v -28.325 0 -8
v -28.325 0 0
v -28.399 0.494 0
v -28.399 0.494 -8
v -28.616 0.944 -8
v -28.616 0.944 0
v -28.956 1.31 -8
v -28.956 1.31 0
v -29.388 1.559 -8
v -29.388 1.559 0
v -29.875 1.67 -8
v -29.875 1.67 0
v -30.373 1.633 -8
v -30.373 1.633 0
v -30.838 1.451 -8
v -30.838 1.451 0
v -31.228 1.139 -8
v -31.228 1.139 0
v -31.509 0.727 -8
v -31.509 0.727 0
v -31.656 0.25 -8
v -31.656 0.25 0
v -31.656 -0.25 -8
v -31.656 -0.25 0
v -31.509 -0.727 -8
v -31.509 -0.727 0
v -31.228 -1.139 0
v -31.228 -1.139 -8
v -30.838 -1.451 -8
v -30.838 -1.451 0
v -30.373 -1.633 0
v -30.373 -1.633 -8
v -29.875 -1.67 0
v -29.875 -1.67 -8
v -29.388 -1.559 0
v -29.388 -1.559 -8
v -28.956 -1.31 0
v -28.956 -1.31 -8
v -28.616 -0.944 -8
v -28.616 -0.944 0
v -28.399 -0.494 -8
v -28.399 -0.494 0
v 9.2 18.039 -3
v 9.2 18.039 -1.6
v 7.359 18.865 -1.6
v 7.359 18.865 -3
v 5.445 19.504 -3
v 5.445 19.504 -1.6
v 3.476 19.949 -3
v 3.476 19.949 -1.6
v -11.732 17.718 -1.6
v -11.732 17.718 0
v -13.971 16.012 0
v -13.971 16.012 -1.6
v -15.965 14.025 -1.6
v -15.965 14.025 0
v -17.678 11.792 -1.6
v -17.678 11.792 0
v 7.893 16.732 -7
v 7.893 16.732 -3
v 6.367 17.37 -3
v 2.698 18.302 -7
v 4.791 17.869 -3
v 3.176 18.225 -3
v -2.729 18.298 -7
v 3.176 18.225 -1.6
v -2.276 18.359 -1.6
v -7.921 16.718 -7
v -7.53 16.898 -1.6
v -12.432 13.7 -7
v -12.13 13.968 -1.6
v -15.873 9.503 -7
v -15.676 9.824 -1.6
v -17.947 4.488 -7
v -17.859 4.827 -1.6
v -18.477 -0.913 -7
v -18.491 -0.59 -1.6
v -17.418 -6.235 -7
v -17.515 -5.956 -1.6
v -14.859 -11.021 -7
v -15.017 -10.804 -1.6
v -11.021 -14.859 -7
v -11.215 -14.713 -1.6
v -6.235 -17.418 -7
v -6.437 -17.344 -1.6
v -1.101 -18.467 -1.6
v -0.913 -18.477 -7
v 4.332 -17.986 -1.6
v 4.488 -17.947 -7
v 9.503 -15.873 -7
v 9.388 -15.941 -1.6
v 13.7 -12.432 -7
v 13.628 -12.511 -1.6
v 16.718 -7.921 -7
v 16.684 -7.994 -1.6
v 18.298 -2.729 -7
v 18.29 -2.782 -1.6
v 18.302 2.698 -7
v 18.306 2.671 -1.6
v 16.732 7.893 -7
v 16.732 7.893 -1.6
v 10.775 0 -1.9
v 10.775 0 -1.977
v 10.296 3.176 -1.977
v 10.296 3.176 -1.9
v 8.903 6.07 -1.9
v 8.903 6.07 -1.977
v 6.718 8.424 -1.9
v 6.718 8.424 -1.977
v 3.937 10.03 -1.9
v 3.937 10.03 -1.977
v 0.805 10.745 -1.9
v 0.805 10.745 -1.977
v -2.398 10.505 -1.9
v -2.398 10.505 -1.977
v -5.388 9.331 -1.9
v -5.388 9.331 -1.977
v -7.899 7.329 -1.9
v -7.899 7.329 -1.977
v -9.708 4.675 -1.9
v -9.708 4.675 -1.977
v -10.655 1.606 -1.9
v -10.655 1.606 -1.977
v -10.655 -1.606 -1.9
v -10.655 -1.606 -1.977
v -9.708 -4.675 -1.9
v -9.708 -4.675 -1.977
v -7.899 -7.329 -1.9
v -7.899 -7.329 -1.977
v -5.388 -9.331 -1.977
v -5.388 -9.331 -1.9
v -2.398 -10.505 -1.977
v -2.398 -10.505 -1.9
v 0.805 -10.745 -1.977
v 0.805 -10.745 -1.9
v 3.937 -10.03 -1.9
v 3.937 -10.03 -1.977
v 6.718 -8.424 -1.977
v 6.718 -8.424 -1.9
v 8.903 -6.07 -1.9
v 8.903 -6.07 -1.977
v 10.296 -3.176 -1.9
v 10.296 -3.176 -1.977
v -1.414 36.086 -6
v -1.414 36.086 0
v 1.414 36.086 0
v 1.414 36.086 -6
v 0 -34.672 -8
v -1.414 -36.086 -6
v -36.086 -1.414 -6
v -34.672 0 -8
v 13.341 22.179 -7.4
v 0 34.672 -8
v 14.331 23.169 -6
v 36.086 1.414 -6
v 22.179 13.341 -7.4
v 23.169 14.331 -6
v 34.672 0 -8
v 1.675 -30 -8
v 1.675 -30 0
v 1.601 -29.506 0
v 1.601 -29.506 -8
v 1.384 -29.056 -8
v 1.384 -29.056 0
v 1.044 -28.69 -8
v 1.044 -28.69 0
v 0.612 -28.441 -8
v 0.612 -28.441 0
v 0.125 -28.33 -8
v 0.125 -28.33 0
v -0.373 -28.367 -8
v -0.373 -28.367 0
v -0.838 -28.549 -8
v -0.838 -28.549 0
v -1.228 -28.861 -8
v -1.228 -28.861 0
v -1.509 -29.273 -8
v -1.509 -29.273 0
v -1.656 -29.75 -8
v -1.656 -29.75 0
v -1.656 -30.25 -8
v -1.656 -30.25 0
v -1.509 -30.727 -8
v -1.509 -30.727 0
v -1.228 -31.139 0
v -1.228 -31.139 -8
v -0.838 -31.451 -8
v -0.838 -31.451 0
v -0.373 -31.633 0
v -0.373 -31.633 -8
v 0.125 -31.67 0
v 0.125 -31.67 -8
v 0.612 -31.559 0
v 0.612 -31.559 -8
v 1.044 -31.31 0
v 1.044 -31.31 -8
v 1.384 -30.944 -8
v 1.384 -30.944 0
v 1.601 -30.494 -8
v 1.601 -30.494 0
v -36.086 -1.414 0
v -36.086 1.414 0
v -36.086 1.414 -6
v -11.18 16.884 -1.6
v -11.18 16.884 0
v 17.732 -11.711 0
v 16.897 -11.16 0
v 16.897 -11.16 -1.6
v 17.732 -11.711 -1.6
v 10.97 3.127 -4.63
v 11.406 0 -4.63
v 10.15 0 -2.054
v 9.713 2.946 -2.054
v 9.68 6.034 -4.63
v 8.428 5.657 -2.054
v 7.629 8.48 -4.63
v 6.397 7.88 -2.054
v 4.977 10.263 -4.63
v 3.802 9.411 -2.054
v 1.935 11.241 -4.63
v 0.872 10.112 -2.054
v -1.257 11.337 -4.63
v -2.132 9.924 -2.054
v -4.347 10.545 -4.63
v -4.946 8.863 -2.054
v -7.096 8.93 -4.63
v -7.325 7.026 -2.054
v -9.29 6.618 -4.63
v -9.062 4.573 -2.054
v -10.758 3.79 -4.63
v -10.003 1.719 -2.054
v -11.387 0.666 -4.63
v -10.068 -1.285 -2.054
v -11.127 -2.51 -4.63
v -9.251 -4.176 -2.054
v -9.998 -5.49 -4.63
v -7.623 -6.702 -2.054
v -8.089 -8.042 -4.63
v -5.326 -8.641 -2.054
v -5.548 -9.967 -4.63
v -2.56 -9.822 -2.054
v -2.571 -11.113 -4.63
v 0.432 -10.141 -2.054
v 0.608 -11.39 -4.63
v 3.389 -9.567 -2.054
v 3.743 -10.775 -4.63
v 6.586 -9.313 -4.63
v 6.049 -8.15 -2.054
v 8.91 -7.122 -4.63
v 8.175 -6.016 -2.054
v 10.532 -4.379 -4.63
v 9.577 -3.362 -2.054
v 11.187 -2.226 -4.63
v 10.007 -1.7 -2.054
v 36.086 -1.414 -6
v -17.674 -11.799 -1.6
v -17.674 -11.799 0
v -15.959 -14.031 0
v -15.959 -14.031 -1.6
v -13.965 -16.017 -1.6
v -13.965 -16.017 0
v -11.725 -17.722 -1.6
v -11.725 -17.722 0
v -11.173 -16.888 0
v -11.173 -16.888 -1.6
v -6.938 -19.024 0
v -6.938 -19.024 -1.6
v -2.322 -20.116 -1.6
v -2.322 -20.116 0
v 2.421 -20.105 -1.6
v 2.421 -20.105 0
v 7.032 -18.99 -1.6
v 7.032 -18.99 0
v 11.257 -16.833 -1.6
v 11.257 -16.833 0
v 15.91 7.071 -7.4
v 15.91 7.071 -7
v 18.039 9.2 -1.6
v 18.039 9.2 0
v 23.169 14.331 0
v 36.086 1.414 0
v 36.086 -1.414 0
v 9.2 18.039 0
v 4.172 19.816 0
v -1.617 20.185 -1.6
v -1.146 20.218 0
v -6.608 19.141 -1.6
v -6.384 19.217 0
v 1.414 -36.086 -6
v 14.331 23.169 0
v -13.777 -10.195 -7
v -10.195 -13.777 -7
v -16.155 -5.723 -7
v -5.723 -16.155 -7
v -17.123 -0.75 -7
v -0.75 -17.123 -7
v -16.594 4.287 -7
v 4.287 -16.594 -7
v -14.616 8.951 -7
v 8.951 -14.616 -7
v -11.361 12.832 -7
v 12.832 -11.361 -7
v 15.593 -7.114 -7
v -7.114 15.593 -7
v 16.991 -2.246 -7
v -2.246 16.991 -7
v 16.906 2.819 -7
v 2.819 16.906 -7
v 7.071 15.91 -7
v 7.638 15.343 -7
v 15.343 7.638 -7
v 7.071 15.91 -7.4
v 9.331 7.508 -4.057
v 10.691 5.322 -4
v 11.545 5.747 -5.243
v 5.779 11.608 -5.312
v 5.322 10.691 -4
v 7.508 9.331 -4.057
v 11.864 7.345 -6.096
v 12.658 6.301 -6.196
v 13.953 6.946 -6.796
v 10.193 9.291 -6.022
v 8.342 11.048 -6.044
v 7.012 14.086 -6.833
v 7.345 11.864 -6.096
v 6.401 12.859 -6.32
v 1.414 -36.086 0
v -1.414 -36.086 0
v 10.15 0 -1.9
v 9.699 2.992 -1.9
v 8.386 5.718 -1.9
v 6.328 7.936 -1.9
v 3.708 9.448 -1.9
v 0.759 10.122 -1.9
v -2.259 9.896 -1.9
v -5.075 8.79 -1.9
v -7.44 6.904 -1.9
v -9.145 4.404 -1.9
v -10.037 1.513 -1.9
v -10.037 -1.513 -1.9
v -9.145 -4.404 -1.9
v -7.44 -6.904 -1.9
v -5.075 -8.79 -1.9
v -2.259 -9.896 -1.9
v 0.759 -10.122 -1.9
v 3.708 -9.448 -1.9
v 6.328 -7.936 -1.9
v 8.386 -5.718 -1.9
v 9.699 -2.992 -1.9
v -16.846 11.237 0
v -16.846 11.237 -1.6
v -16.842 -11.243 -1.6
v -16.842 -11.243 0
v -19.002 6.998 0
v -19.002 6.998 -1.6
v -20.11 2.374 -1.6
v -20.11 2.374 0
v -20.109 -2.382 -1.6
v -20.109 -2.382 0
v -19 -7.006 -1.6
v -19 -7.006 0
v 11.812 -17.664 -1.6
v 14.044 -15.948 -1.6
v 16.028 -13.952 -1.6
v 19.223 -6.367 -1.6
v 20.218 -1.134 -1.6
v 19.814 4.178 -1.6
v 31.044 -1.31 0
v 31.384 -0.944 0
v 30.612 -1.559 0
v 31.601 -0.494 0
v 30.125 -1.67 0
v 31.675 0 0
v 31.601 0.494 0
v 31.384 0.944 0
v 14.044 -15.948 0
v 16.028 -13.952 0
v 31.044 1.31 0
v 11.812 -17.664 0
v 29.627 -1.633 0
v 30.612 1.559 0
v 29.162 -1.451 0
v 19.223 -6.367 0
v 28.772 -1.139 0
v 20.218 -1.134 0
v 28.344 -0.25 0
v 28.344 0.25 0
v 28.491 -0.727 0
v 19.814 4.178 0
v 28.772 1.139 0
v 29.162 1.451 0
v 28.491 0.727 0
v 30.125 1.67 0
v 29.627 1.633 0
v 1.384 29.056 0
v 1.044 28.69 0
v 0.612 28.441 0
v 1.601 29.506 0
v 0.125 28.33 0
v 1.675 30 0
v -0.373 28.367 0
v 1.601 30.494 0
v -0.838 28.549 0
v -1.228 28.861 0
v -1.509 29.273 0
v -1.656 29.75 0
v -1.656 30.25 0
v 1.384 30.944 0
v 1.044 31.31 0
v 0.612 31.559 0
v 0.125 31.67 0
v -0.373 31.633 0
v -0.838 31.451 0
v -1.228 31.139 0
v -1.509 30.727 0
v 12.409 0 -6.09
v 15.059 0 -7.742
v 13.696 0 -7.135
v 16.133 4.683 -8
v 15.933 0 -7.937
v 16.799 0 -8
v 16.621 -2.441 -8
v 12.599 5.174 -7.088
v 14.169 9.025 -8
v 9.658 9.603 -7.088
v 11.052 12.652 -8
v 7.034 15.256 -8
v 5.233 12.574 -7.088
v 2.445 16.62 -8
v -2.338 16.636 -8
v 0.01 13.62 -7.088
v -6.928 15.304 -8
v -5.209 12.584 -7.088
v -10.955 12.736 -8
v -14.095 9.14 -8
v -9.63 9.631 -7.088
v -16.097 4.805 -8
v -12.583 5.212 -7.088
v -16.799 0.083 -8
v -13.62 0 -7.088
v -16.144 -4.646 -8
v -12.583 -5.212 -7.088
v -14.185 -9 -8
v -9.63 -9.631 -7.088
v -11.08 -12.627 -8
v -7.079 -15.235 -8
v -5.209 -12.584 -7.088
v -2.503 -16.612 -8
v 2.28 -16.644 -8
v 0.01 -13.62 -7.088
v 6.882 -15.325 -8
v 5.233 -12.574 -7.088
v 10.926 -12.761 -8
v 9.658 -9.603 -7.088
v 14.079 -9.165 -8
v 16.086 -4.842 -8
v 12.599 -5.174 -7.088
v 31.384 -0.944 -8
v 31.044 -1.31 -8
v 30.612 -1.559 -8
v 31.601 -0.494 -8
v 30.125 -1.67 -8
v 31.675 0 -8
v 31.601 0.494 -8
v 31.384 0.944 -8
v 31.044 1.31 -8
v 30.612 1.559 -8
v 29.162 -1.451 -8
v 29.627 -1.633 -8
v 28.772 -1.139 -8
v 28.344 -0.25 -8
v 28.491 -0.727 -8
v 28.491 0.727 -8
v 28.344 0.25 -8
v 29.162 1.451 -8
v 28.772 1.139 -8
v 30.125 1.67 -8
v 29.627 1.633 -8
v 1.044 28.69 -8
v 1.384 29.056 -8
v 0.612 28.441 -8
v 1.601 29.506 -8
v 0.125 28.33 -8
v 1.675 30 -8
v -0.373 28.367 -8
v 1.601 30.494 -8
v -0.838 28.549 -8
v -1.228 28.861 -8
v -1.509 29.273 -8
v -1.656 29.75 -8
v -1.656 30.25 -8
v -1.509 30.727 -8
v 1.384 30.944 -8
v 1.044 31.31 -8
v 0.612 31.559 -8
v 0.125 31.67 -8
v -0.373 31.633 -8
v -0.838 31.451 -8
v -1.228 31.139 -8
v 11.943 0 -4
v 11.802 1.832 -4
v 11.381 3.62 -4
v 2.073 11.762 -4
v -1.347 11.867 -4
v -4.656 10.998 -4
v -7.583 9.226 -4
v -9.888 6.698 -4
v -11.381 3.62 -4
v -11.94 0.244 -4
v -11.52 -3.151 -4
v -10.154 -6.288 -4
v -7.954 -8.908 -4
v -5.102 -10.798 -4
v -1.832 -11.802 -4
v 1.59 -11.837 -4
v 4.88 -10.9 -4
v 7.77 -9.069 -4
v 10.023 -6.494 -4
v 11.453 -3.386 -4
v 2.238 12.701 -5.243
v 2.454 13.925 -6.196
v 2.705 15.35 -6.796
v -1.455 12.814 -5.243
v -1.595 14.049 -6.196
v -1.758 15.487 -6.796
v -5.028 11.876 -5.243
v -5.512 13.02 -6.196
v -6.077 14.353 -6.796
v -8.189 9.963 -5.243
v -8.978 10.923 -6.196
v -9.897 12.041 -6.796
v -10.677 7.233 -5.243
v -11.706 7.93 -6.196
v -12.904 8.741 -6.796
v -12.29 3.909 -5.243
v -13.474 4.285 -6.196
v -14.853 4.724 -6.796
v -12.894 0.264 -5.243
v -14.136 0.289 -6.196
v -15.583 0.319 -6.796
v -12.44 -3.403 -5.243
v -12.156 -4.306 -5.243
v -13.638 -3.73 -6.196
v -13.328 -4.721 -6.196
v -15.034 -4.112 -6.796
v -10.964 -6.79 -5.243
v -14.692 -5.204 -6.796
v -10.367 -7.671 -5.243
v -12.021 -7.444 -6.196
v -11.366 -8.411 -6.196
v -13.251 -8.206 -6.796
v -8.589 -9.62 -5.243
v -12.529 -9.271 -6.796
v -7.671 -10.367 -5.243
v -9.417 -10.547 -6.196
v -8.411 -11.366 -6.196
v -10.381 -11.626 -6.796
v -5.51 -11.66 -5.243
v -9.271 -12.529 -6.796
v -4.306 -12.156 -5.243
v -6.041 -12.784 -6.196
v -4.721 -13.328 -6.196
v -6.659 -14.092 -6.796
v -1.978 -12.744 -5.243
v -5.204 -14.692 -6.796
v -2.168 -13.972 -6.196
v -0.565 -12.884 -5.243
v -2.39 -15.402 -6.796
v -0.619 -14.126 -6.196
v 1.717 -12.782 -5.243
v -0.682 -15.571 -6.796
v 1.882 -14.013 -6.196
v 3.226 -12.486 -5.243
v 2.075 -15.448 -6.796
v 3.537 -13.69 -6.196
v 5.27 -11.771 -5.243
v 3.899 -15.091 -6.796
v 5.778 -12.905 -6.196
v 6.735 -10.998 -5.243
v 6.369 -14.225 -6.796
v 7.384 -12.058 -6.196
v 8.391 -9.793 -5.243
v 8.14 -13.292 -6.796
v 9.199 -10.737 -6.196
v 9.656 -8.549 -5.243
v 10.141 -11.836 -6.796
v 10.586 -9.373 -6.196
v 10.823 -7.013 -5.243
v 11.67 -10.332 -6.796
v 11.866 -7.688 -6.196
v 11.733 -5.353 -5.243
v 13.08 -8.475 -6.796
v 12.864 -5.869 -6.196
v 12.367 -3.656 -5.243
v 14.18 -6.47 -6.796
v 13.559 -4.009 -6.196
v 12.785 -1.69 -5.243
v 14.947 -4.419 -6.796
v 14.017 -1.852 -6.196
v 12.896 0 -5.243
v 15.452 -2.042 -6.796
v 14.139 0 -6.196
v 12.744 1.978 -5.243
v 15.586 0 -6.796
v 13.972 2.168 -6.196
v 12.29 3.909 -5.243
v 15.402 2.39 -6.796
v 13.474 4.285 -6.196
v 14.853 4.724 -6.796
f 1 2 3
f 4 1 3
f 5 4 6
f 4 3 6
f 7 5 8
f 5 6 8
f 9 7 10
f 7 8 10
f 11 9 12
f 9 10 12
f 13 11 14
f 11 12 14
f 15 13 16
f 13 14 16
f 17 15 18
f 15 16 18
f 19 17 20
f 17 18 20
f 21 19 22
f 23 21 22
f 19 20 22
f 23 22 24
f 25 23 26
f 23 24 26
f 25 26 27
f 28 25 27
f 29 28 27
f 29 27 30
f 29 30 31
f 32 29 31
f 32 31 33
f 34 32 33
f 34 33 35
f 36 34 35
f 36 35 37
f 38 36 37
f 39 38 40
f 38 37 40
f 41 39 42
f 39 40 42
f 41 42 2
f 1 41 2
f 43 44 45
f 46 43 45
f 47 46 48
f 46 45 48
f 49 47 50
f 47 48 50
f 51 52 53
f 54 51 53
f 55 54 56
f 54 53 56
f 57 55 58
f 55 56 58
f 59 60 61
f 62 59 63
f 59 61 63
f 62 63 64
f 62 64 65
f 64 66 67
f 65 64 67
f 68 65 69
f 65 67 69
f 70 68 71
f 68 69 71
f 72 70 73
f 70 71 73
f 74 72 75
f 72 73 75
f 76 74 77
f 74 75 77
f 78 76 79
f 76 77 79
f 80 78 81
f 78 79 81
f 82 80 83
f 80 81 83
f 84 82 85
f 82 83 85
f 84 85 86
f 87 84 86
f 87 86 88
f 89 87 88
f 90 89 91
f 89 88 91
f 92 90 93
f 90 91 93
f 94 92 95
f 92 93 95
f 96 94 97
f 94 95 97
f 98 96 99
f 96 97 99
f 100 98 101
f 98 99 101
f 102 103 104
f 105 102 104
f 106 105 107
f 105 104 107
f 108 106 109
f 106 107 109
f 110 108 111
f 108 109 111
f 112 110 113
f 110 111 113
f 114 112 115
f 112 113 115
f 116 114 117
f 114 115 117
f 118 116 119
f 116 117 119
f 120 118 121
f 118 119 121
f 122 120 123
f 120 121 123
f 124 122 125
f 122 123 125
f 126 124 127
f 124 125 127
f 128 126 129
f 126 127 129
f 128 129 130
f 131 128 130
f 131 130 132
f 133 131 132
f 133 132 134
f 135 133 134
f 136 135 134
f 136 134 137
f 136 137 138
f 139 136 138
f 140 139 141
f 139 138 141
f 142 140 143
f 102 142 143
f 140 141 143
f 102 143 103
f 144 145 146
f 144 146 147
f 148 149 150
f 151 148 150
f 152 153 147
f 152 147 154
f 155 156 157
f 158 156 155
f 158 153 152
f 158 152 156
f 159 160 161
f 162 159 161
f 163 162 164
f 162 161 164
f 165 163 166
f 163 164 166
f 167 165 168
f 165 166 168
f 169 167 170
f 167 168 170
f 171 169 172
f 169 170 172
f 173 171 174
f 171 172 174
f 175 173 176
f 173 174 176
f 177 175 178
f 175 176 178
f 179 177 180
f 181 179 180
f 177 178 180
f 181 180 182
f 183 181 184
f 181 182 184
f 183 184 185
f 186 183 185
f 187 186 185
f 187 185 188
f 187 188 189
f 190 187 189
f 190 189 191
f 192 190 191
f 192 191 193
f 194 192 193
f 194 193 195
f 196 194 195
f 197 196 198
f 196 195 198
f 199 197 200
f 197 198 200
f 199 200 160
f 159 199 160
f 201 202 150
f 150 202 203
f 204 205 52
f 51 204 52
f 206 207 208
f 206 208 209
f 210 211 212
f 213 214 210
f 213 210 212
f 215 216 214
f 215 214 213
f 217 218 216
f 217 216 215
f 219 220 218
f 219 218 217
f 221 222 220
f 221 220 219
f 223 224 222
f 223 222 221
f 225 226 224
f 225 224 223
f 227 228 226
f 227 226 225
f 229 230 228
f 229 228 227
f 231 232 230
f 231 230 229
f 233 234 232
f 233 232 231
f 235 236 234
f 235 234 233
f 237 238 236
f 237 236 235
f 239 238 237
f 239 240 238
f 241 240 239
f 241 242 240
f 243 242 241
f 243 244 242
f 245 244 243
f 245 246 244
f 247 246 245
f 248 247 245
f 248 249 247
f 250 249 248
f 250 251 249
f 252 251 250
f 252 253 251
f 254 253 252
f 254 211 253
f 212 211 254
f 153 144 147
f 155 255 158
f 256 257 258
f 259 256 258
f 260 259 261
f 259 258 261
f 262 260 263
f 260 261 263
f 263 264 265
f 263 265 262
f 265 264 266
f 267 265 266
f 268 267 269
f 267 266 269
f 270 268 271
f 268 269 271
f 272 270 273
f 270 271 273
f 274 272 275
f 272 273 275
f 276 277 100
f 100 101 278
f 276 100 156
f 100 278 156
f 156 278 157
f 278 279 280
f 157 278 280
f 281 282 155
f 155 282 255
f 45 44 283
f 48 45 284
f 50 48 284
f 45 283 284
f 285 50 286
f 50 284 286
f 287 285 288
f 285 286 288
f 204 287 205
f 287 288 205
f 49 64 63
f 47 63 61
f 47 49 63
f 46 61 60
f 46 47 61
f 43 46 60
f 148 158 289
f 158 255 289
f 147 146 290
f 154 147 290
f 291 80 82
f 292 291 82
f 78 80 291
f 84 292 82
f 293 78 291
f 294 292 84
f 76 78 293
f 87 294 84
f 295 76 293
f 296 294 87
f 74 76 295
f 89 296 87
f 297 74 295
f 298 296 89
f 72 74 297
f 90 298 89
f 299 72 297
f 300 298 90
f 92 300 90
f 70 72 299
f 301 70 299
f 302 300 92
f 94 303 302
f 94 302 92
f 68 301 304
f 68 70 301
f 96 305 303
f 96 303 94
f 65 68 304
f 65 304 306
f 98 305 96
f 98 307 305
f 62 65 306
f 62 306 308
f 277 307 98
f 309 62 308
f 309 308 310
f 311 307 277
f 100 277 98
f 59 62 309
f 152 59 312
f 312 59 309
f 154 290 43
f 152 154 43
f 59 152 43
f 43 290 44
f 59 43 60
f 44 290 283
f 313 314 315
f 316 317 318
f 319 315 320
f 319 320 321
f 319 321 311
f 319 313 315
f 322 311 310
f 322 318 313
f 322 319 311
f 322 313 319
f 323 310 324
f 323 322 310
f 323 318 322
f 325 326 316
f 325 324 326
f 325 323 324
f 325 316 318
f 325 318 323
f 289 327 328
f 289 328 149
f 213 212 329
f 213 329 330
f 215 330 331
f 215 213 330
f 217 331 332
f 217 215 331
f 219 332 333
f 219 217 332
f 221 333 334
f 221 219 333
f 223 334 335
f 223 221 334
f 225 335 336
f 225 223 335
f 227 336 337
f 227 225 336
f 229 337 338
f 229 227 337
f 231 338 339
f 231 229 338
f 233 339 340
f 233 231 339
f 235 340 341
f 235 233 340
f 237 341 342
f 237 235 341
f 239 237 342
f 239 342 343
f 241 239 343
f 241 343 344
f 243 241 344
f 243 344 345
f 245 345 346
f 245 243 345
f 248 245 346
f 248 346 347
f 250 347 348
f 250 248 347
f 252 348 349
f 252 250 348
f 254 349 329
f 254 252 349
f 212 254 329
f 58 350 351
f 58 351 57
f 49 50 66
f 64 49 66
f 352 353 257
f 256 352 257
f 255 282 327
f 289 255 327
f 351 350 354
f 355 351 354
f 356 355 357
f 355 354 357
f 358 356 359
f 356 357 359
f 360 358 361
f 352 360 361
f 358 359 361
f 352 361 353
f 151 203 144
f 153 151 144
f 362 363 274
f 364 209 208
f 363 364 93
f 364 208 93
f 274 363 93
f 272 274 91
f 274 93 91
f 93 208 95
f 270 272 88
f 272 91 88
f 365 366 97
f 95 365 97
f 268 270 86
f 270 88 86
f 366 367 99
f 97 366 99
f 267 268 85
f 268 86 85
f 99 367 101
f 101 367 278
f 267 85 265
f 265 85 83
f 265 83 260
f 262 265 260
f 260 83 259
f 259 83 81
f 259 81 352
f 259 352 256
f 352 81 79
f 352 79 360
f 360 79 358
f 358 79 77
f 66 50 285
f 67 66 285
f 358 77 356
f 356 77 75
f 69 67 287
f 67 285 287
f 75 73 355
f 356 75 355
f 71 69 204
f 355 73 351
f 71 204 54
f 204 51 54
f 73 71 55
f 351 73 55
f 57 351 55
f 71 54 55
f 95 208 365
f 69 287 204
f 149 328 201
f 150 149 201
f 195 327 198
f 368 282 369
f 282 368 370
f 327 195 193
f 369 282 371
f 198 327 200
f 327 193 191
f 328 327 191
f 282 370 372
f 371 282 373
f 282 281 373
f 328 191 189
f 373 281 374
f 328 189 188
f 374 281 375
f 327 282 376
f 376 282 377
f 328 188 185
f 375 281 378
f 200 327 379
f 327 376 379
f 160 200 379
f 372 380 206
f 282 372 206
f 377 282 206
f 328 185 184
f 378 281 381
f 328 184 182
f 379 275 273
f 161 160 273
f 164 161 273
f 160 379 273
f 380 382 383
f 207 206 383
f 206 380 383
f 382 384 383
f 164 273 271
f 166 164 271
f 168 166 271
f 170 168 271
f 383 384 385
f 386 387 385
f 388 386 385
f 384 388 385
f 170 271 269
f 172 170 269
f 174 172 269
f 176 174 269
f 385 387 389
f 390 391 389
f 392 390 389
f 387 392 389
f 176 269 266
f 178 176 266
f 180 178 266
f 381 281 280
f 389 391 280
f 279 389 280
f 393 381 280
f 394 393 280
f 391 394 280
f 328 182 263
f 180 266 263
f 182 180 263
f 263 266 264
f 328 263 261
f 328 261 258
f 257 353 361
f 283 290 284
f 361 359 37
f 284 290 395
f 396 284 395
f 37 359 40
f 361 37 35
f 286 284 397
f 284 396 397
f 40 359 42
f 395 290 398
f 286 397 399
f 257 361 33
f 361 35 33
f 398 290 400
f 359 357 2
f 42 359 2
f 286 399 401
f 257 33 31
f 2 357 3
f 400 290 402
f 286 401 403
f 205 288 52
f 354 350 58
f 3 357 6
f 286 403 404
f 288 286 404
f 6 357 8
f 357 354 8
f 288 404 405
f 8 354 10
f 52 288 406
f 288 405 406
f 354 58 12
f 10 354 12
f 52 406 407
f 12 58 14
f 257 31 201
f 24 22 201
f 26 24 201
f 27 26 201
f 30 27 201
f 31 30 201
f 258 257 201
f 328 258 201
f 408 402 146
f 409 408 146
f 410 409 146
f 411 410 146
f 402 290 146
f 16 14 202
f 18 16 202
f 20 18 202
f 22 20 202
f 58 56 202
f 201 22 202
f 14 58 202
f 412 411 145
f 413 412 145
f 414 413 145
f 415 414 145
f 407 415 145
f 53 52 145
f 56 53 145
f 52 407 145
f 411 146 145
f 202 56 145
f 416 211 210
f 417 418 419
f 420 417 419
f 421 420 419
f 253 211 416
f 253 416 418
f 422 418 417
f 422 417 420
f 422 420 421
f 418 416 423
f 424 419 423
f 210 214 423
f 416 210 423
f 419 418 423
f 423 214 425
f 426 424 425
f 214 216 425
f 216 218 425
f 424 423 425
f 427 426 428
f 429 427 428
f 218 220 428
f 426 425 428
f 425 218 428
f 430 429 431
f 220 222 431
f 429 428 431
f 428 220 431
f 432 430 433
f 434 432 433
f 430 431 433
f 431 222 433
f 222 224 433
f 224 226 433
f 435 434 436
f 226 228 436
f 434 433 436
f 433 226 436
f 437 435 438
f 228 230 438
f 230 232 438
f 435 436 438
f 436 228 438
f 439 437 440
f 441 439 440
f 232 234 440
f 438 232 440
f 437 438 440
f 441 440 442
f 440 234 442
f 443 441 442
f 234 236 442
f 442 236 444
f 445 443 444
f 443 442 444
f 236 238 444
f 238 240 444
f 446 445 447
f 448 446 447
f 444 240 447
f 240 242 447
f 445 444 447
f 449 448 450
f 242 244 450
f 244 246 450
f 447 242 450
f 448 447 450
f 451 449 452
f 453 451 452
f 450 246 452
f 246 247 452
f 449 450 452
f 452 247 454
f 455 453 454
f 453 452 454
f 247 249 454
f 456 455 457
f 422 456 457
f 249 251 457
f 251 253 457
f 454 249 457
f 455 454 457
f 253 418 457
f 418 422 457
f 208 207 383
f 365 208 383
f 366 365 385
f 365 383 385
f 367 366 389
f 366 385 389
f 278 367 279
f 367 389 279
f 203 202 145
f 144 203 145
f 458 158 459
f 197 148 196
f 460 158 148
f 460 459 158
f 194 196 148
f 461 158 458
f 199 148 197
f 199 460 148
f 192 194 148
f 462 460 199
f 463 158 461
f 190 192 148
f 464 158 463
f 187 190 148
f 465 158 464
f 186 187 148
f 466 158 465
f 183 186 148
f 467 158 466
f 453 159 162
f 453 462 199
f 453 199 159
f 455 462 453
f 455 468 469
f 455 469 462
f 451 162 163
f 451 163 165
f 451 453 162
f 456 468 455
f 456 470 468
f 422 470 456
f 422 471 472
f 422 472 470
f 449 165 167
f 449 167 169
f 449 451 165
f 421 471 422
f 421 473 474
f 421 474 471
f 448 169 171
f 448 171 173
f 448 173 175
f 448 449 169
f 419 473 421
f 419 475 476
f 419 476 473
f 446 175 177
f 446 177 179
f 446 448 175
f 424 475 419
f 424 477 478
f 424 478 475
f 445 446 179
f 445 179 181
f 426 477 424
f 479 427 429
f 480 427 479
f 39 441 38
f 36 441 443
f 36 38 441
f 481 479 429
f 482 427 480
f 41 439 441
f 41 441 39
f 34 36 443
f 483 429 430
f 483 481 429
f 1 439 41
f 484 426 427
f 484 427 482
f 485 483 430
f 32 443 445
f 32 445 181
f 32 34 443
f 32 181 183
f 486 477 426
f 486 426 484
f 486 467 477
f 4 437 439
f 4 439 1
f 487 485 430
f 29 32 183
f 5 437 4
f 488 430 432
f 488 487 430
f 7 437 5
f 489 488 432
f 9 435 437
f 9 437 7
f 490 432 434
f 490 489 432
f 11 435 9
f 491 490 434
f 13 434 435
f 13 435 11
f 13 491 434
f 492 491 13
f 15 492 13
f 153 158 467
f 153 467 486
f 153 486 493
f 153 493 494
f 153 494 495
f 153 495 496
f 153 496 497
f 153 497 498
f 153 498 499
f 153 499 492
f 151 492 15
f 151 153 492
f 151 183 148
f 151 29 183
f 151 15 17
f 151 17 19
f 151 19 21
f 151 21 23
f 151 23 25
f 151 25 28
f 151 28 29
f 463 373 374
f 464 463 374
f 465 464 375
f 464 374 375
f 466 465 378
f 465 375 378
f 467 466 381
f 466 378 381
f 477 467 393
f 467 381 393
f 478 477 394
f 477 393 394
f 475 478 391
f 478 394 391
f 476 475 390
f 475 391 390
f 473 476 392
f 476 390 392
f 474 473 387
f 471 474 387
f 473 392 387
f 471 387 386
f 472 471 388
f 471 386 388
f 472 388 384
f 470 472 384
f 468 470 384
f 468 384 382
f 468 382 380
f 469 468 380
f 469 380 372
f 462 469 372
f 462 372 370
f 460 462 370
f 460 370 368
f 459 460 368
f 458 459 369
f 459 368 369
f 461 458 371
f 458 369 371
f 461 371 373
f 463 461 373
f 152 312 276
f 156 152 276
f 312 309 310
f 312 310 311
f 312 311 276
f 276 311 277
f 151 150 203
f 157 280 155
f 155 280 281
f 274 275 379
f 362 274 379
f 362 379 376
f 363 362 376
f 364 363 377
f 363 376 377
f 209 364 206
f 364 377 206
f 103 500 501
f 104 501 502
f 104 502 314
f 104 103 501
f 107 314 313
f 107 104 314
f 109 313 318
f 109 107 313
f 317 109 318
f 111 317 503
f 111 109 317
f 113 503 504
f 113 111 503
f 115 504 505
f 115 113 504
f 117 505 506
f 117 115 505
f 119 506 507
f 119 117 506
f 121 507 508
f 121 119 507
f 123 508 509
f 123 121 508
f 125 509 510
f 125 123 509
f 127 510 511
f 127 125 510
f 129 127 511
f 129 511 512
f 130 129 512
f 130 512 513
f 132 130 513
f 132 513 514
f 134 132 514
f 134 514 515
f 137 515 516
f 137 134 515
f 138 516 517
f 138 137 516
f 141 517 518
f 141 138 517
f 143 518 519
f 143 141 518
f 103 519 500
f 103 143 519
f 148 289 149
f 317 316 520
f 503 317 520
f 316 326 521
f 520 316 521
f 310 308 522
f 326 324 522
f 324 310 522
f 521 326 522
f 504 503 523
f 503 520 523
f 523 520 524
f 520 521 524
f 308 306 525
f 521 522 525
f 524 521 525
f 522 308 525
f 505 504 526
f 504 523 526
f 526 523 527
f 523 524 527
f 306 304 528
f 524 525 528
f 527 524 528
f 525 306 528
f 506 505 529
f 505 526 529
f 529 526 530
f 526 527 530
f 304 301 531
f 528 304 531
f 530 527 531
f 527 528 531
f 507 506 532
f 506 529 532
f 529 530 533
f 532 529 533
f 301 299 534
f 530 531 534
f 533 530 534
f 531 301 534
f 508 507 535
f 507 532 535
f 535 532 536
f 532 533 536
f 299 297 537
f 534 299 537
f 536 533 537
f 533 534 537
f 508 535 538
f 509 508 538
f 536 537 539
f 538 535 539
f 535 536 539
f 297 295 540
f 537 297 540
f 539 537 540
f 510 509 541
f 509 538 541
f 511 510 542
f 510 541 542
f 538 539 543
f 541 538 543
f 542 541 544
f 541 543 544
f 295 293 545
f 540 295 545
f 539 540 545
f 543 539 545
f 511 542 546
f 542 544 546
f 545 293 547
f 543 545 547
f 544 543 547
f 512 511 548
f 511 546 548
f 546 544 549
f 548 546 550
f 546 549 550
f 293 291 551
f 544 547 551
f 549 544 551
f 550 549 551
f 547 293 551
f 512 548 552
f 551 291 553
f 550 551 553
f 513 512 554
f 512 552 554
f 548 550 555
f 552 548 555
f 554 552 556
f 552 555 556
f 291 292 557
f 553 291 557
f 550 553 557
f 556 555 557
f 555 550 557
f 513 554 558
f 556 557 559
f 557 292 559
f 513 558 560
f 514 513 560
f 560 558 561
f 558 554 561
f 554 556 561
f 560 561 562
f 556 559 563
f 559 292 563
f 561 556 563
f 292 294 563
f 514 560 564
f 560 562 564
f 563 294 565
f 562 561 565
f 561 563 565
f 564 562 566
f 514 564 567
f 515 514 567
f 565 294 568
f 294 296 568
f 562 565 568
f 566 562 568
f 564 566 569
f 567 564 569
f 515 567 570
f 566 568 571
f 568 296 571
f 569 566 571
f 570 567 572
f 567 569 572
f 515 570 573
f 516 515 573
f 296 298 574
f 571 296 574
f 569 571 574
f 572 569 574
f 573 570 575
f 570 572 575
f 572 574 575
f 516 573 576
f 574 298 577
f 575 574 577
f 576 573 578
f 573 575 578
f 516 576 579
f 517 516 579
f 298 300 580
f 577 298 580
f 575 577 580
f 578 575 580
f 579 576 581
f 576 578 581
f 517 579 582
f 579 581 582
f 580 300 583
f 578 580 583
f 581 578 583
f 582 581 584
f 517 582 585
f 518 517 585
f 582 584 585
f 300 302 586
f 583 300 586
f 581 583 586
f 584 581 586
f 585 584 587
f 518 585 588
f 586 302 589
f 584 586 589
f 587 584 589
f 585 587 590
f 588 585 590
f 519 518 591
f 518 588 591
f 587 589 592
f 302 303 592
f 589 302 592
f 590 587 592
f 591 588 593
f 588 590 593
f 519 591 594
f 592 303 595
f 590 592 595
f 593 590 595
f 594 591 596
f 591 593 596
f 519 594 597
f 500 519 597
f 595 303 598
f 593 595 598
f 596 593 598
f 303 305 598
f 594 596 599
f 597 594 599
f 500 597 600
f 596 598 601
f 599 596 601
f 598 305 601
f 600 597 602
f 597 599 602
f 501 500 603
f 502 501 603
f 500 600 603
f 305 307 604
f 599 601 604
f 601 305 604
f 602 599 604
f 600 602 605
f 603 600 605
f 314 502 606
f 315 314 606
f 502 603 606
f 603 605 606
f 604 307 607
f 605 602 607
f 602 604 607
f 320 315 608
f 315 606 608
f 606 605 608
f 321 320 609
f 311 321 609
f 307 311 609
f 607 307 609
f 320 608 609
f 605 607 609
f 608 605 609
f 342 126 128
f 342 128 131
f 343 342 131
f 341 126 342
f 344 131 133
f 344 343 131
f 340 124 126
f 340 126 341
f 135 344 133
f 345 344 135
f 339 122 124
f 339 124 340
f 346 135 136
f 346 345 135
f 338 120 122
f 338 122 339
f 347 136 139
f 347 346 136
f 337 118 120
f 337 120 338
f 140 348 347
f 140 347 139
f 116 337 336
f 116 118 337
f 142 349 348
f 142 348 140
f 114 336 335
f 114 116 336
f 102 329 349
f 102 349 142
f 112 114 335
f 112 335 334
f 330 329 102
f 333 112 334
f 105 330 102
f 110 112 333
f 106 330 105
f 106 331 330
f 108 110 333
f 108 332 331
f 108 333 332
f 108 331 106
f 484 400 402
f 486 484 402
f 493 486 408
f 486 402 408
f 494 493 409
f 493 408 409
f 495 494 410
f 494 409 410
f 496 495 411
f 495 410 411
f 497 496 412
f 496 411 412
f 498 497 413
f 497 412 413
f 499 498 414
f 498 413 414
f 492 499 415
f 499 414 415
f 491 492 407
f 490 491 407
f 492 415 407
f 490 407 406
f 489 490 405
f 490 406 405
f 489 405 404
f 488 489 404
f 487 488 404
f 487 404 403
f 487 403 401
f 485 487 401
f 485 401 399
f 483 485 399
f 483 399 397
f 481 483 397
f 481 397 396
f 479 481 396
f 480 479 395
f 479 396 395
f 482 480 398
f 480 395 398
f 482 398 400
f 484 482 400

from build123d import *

# Parameters (mm, degrees)
SKETCH_R         = 10.15
SKETCH_R_2       = 1.675
PAD_DEPTH        = 8
SKETCH001_R      = 18.5
POCKET_DEPTH     = 7
POCKET001_DEPTH  = 1.6
POCKET004_DEPTH  = 3
CHAMFER_SIZE     = 2
POCKET002_DEPTH  = 7.4
SKETCH005_R      = 10.775
SKETCH005_R_2    = 10.15
PAD001_DEPTH     = 5.1
CHAMFER001_ANGLE = 64
CHAMFER001_SIZE  = 2.9
CHAMFER002_ANGLE = 60
CHAMFER002_SIZE  = 2.9
FILLET_R         = 6


with BuildPart() as part:
    # Sketch → Pad (new body)
    with BuildSketch(Plane.XY):
        Polygon((0, 37.5), (37.5, 0), (0, -37.5), (-37.5, 0), align=None)
        Circle(SKETCH_R, mode=Mode.SUBTRACT)
        with Locations((0, 30)):
            Circle(SKETCH_R_2, mode=Mode.SUBTRACT)
        with Locations((30, 0)):
            Circle(SKETCH_R_2, mode=Mode.SUBTRACT)
        with Locations((0, -30)):
            Circle(SKETCH_R_2, mode=Mode.SUBTRACT)
        with Locations((-30, 0)):
            Circle(SKETCH_R_2, mode=Mode.SUBTRACT)
    extrude(amount=-PAD_DEPTH)

    # Sketch001 → Pocket (cut)
    with BuildSketch(Plane.XY):
        Circle(SKETCH001_R)
    extrude(amount=-POCKET_DEPTH, mode=Mode.SUBTRACT)

    # Sketch002 → Pocket001 (cut)
    with BuildSketch(Plane.XY):
        with BuildLine():
            Line((-16.846352, 11.236678), (-17.67827, 11.791576))
            ThreePointArc((-11.732099, 17.717798), (-15.000749, 15.051247), (-17.67827, 11.791576))
            Line((-11.18, 16.884019), (-11.732099, 17.717798))
            ThreePointArc((16.897228, -11.160027), (14.310444, 14.327376), (-11.18, 16.884019))
            Line((16.897228, -11.160027), (17.731659, -11.711139))
            ThreePointArc((11.812473, -17.664314), (15.068975, -14.98294), (17.731659, -11.711139))
            Line((11.256591, -16.833052), (11.812473, -17.664314))
            ThreePointArc((-11.17334, -16.888427), (0.049993, -20.249938), (11.256591, -16.833052))
            Line((-11.17334, -16.888427), (-11.72511, -17.722423))
            ThreePointArc((-17.673618, -11.798547), (-14.994812, -15.057162), (-11.72511, -17.722423))
            Line((-16.841919, -11.243321), (-17.673618, -11.798547))
            ThreePointArc((-16.846352, 11.236678), (-20.25, -0.003993), (-16.841919, -11.243321))
        make_face()
    extrude(amount=-POCKET001_DEPTH, mode=Mode.SUBTRACT)

    # Sketch004 → Pocket004 (cut)
    with BuildSketch(Plane.XY):
        with BuildLine():
            Line((3.47625, 19.949391), (3.09, 17.732792))
            ThreePointArc((8.300497, 15.971905), (5.762902, 17.052535), (3.09, 17.732792))
            Line((8.300497, 15.971905), (9.338059, 17.968393))
            ThreePointArc((9.338059, 17.968393), (6.483264, 19.184102), (3.47625, 19.949391))
        make_face()
    extrude(amount=-POCKET004_DEPTH, mode=Mode.SUBTRACT)

    # Chamfer
    chamfer_edges = [part.edges().sort_by_distance(p)[0] for p in [
        (18.75, -18.75, -8),
        (37.5, 0, -4),
        (0, -37.5, -4),
        (-18.75, -18.75, -8),
        (-37.5, 0, -4),
        (-18.75, 18.75, -8),
        (0, 37.5, -4),
        (18.75, 18.75, -8),
    ]]
    chamfer(chamfer_edges, length=CHAMFER_SIZE)

    # Sketch003 → Pocket002 (cut)
    with BuildSketch(Plane.XY):
        Polygon((7.071068, 15.909903), (15.909903, 7.071068), (26.516504, 17.67767), (17.67767, 26.516504), align=None)
    extrude(amount=-POCKET002_DEPTH, mode=Mode.SUBTRACT)

    # Sketch005 (on DatumPlane) → Pad001 (join)
    with BuildSketch(Plane.XY.offset(-7)):
        Circle(SKETCH005_R)
        Circle(SKETCH005_R_2, mode=Mode.SUBTRACT)
    extrude(amount=PAD001_DEPTH)

    # Chamfer001
    chamfer001_edges = [part.edges().sort_by_distance(p)[0] for p in [
        (-10.15, 0, -8),
    ]]
    chamfer001_side = part.faces().sort_by_distance((16.642355, -16.642355, -8))[0]
    chamfer(chamfer001_edges, length=CHAMFER001_SIZE, angle=CHAMFER001_ANGLE, reference=chamfer001_side)

    # Chamfer002
    chamfer002_edges = [part.edges().sort_by_distance(p)[0] for p in [
        (-10.775, 0, -7),
    ]]
    chamfer002_side = part.faces().sort_by_distance((-15.182869, -9.62516, -7))[0]
    chamfer(chamfer002_edges, length=CHAMFER002_SIZE, angle=CHAMFER002_ANGLE, reference=chamfer002_side)

    # Fillet
    fillet_edges = [part.edges().sort_by_distance(p)[0] for p in [
        (-13.05, 0, -8),
        (-13.675, 0, -7),
    ]]
    fillet(fillet_edges, radius=FILLET_R)


solid = part.part
